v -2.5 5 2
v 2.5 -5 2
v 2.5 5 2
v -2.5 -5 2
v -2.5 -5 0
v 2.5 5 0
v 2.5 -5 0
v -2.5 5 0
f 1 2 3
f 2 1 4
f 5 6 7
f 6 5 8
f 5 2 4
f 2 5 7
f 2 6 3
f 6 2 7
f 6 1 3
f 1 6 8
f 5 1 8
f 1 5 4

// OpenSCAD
// plate 1x2

// external vars #########################

ext_scale = 1.0;
ext_fn = 12;

// part ##################################

module plate_1x2(m_scale=ext_scale,m_fn=ext_fn) {
    scale([m_scale,m_scale,m_scale])
    translate([-2.5,-5,0])
    cube([5,10,2]);
}

plate_1x2();
